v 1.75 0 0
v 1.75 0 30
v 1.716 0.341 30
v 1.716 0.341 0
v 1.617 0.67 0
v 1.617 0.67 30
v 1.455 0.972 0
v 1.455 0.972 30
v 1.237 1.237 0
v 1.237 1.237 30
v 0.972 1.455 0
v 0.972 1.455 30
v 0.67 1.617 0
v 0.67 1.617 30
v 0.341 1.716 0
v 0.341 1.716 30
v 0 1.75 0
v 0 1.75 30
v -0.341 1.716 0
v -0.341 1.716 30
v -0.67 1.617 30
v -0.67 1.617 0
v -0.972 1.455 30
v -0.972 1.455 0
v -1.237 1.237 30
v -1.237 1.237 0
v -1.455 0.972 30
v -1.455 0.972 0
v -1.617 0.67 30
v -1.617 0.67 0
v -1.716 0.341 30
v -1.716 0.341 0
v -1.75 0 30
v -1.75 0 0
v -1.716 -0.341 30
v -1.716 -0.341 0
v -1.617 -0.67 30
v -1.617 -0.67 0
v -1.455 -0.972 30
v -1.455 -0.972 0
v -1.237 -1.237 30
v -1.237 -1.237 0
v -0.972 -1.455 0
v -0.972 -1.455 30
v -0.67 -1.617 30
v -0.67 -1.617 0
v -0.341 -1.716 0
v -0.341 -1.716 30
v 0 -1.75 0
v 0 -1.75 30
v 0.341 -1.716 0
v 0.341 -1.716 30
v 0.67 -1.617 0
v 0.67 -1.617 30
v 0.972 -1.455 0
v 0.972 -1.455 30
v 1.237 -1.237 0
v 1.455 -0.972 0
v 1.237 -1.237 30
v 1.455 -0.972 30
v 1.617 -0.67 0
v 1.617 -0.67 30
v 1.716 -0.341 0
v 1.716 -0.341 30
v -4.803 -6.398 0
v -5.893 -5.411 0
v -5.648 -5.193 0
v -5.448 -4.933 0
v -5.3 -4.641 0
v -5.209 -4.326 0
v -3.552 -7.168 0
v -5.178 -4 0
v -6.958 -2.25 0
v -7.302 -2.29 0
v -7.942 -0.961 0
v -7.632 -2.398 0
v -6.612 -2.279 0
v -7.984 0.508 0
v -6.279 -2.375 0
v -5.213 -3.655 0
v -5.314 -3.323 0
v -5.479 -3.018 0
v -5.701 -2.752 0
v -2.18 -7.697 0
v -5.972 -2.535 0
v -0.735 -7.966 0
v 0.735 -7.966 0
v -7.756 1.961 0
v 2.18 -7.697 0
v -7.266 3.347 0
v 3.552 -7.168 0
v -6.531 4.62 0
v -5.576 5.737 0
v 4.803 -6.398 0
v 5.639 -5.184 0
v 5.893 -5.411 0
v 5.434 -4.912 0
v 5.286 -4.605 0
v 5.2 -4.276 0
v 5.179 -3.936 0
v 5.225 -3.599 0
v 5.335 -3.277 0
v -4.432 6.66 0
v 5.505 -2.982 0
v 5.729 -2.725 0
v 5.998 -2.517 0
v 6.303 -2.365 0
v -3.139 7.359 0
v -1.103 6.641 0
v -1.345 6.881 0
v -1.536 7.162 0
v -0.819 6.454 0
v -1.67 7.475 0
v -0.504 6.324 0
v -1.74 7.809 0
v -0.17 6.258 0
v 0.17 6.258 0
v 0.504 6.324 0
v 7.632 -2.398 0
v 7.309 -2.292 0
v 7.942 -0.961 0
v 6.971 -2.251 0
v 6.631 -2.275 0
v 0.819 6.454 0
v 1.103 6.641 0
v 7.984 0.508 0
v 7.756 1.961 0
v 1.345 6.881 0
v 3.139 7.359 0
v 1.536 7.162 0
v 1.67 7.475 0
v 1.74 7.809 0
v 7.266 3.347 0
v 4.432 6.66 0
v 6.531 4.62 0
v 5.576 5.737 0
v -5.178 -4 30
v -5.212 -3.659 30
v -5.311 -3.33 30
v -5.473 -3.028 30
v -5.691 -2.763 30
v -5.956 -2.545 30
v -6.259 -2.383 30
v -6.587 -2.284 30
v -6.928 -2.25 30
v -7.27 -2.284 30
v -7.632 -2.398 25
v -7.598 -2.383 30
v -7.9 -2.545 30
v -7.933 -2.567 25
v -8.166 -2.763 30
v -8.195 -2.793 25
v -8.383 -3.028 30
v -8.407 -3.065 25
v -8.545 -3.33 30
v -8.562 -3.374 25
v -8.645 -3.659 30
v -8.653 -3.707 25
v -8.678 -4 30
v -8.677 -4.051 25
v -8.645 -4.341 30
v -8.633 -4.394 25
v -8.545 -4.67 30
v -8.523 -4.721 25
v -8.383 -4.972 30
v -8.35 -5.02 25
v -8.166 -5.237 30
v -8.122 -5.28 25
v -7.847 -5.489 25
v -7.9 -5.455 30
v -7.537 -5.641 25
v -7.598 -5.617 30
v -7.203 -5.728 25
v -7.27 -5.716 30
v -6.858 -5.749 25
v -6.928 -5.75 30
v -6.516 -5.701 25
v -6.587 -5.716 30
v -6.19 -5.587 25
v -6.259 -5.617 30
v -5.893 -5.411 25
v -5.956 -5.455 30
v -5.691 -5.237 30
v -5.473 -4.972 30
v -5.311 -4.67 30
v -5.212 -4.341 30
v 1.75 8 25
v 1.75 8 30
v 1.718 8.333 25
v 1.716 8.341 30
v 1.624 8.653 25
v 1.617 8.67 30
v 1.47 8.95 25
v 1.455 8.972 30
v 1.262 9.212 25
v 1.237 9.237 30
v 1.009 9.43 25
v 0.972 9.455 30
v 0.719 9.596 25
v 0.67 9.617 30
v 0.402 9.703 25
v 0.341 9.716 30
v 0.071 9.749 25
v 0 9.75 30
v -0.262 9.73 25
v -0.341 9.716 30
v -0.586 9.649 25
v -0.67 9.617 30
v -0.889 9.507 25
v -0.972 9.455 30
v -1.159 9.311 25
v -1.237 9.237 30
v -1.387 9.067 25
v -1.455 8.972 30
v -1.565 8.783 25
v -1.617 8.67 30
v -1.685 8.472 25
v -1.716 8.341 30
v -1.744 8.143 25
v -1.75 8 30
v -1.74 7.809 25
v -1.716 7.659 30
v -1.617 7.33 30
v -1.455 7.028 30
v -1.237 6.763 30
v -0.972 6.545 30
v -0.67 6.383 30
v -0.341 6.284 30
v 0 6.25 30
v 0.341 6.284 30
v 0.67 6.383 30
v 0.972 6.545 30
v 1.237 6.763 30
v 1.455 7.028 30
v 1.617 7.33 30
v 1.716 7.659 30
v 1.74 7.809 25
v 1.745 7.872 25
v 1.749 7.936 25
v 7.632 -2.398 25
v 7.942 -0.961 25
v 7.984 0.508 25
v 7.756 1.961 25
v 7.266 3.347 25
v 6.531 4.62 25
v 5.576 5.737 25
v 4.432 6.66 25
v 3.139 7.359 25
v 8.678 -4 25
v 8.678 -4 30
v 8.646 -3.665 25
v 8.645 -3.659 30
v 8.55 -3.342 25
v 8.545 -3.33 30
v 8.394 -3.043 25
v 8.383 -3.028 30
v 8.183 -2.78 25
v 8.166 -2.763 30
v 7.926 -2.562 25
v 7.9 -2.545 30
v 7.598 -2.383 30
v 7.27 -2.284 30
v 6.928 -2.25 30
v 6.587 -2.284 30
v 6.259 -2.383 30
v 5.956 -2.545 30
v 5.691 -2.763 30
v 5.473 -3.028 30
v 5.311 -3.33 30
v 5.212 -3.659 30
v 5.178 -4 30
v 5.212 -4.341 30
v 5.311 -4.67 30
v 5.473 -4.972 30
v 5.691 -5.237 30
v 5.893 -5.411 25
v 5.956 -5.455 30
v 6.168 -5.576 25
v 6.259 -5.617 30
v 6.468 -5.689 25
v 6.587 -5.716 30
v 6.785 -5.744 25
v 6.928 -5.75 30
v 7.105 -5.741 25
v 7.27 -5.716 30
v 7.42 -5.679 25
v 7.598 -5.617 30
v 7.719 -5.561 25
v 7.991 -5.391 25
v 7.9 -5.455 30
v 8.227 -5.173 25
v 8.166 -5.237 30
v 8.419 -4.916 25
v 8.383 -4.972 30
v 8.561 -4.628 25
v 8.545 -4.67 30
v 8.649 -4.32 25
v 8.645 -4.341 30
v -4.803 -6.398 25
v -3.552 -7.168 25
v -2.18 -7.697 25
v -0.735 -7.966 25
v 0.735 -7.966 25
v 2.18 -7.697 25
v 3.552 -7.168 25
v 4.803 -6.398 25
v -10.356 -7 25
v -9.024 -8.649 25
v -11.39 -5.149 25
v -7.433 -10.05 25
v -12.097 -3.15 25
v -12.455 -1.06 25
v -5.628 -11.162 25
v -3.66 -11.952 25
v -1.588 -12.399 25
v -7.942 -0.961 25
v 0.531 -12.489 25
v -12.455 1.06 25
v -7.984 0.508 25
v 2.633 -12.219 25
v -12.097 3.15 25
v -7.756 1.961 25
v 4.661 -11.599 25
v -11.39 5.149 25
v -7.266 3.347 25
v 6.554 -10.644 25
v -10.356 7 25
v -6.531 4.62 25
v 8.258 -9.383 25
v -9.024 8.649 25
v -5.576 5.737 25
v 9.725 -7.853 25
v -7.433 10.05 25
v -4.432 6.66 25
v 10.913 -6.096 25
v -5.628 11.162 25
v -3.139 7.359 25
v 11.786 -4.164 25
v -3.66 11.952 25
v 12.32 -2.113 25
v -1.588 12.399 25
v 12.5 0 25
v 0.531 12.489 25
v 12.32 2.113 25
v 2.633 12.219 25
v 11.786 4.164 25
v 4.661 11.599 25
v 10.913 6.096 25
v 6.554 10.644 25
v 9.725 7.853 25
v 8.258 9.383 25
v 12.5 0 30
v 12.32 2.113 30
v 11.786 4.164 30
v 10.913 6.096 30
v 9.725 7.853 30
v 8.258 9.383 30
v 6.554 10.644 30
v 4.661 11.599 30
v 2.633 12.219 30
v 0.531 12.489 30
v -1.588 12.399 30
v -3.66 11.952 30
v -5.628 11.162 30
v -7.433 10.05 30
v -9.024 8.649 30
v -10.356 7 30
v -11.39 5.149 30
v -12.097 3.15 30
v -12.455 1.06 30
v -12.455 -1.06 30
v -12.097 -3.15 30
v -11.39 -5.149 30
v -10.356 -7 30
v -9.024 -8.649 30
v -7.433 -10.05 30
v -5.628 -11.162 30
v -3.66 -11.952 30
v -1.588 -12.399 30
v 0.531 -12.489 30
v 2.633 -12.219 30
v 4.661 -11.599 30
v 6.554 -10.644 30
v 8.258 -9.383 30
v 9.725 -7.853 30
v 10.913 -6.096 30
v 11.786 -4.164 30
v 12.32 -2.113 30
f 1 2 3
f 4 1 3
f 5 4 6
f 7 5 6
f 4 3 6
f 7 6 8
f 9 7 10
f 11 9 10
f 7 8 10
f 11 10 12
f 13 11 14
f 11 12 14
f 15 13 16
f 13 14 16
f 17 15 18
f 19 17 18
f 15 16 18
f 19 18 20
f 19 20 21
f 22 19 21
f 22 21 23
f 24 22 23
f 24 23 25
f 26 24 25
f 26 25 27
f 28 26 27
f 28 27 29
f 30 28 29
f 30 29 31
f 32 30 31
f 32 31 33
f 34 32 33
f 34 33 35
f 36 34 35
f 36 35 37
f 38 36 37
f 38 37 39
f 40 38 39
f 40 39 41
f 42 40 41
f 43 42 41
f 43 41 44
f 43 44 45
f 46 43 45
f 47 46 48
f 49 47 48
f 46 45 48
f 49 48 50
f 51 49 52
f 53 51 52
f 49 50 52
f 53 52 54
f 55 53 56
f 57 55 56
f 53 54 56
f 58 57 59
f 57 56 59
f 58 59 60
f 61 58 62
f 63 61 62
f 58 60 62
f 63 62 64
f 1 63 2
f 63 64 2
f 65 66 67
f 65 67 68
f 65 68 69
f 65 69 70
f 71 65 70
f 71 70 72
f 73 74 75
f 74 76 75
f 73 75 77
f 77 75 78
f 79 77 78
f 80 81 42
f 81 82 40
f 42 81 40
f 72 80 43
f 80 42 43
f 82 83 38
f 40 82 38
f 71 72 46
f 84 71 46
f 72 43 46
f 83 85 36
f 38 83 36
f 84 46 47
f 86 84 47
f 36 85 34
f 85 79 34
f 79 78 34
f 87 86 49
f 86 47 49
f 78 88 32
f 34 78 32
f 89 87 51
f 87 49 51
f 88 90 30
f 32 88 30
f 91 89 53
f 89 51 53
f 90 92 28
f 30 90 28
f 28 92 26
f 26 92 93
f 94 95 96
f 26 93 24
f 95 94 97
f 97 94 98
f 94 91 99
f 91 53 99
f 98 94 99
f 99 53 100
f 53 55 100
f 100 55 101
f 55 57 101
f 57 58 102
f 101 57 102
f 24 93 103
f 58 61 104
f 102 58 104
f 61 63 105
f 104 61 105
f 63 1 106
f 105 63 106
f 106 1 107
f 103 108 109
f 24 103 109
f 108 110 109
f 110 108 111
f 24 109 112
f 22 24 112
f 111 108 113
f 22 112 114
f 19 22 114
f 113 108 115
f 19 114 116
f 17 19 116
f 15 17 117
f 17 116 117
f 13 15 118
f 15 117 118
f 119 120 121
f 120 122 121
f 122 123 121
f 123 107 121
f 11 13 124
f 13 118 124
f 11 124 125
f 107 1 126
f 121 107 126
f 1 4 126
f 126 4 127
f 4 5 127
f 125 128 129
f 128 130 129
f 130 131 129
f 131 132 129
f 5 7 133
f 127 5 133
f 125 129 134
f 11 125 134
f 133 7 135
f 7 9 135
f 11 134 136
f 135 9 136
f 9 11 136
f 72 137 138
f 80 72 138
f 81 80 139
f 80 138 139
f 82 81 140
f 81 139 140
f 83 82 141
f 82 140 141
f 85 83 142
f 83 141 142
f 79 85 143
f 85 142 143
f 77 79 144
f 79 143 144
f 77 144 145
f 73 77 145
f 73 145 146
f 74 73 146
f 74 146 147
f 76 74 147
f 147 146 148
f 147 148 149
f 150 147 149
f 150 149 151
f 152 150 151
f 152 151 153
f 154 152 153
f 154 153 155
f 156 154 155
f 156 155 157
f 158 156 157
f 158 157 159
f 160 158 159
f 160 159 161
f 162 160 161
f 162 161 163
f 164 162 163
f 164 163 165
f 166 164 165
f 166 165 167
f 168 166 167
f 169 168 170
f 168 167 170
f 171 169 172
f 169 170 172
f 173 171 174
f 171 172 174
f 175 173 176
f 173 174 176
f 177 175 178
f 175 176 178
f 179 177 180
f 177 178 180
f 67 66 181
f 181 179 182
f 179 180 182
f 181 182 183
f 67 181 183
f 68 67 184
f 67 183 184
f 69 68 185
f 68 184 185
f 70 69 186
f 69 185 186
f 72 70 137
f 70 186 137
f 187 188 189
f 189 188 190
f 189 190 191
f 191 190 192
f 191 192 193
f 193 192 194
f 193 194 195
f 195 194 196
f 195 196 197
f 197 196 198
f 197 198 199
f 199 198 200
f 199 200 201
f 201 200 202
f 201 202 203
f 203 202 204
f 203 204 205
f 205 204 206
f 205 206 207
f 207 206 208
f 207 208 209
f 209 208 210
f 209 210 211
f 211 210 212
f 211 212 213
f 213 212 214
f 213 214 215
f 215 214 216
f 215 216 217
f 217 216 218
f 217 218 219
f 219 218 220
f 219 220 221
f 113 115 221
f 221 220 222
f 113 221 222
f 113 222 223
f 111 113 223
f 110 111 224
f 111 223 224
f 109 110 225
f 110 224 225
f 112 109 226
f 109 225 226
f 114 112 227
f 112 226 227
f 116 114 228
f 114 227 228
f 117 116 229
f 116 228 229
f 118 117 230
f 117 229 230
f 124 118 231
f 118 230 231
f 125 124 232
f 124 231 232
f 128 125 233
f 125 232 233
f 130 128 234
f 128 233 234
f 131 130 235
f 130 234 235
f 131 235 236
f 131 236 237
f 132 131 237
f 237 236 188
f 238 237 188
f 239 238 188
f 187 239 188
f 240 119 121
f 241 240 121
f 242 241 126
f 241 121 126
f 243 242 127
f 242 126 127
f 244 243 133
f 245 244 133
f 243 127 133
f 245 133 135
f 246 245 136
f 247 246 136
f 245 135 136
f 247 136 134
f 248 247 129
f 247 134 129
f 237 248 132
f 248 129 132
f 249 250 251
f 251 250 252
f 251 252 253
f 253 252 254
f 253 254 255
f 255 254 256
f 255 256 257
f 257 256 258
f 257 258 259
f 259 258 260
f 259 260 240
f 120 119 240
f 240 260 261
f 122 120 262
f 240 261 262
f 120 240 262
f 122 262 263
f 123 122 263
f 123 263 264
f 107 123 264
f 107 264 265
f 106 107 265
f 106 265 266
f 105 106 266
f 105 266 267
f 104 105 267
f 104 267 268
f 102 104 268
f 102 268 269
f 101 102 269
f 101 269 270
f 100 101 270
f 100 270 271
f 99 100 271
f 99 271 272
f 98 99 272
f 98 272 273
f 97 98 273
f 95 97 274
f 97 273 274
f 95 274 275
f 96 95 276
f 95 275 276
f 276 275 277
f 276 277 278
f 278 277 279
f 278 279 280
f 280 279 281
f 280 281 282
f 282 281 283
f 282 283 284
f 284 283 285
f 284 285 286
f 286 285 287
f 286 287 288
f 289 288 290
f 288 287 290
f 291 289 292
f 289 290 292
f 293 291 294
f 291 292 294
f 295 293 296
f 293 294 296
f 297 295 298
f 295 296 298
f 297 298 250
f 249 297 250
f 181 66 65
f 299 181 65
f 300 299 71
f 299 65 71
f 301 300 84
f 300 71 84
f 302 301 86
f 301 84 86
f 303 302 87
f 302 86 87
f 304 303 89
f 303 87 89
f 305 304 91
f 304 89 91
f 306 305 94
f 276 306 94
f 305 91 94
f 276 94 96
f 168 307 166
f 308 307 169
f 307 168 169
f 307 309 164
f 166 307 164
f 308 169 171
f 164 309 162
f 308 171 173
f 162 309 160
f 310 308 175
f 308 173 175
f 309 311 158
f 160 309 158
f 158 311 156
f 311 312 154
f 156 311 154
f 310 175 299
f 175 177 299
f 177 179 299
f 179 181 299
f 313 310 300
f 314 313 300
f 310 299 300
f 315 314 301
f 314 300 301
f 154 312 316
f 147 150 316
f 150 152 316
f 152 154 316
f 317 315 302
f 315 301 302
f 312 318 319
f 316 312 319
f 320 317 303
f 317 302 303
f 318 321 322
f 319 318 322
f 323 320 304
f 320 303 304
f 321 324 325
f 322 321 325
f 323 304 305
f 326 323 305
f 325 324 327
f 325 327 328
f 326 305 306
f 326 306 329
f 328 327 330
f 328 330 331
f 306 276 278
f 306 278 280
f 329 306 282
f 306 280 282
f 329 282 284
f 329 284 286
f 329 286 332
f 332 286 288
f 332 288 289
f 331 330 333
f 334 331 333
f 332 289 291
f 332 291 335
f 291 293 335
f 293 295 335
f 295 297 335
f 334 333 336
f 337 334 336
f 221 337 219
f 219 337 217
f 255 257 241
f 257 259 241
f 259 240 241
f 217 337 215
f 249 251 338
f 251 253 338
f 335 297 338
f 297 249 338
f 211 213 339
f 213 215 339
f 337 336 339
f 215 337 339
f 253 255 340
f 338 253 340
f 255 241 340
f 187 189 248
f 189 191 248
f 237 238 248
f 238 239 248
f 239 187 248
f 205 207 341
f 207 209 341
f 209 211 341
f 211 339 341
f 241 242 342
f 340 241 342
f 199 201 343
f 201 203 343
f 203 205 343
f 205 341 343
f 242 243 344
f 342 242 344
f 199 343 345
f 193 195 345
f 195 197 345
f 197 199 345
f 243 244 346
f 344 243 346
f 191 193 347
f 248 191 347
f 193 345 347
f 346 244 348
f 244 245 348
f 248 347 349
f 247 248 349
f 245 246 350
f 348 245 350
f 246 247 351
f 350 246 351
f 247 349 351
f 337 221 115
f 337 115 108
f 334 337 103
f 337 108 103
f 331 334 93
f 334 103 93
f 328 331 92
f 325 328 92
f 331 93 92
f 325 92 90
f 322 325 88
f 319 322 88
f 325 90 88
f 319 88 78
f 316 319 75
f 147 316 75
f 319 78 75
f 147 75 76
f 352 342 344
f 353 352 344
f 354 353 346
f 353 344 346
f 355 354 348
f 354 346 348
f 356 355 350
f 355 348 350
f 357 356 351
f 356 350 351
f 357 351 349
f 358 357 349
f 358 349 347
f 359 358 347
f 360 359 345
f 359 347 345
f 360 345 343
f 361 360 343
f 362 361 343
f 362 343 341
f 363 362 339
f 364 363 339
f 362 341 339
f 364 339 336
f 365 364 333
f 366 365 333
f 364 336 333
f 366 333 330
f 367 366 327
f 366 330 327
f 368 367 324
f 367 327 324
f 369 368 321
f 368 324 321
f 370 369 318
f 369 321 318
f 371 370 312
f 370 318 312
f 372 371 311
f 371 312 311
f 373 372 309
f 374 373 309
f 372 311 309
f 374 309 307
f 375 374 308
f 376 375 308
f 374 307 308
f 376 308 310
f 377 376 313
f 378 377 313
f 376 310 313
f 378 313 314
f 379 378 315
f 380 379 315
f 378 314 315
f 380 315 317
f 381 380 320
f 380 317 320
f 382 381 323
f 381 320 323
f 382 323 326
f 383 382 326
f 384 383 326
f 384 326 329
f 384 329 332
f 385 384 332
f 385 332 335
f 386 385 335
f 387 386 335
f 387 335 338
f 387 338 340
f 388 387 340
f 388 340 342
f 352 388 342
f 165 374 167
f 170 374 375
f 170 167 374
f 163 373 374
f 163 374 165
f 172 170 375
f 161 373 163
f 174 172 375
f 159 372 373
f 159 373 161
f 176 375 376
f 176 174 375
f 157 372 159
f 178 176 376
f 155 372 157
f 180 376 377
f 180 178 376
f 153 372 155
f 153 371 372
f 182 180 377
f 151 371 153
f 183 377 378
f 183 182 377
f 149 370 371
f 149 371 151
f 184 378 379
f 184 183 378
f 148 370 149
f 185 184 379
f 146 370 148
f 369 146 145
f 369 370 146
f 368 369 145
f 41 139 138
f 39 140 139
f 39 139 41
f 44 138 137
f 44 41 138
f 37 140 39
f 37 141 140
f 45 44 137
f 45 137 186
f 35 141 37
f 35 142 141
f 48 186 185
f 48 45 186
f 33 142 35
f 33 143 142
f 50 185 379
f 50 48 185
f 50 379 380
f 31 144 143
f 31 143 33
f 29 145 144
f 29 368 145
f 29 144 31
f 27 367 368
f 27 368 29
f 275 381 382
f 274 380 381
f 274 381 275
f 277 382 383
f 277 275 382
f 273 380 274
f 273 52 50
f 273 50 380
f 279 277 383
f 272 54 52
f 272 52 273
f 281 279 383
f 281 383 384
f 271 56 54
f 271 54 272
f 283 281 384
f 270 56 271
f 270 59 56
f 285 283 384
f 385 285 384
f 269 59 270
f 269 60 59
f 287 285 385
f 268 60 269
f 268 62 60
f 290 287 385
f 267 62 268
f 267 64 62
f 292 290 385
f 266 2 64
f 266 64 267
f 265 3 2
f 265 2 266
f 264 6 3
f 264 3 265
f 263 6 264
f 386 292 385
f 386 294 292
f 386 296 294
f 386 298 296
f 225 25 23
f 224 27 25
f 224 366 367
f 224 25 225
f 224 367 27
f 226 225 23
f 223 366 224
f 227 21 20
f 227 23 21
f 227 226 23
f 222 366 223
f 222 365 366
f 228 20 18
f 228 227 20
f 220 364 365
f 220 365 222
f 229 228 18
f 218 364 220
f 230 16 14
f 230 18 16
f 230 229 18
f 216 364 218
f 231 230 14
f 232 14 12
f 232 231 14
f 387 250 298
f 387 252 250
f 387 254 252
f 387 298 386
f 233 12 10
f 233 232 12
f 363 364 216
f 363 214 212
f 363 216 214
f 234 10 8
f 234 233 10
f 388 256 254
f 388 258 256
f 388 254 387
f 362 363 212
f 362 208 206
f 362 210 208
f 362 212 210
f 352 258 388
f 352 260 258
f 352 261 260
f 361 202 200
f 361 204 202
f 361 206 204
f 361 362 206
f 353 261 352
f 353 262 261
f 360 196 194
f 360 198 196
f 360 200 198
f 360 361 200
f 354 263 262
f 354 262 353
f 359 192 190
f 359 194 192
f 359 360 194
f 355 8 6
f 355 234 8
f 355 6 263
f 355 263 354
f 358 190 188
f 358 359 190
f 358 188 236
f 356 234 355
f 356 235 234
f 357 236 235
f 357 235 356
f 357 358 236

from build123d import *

# Parameters (mm, degrees)
SKETCH_1_R          = 8
EXTRUDE_1_DEPTH     = 25
SKETCH_2_R          = 12.5
EXTRUDE_2_DEPTH     = 5
SKETCH_3_R          = 1.75
CUT_EXTRUDE_1_DEPTH = 38


with BuildPart() as part:
    # 草图1 → 凸台-拉伸1 (new body)
    with BuildSketch(Plane.XY):
        Circle(SKETCH_1_R)
    extrude(amount=EXTRUDE_1_DEPTH)

    # 草图2 → 凸台-拉伸2 (add)
    with BuildSketch(Plane.XY.offset(25)):
        Circle(SKETCH_2_R)
    extrude(amount=EXTRUDE_2_DEPTH)

    # 草图3 → 切除-拉伸1 (cut)
    with BuildSketch(Plane.XY.offset(30)):
        Circle(SKETCH_3_R)
        with Locations((0, 8)):
            Circle(SKETCH_3_R)
        with Locations((-6.92820323, -4)):
            Circle(SKETCH_3_R)
        with Locations((6.92820323, -4)):
            Circle(SKETCH_3_R)
    extrude(amount=-CUT_EXTRUDE_1_DEPTH, mode=Mode.SUBTRACT)


solid = part.part
